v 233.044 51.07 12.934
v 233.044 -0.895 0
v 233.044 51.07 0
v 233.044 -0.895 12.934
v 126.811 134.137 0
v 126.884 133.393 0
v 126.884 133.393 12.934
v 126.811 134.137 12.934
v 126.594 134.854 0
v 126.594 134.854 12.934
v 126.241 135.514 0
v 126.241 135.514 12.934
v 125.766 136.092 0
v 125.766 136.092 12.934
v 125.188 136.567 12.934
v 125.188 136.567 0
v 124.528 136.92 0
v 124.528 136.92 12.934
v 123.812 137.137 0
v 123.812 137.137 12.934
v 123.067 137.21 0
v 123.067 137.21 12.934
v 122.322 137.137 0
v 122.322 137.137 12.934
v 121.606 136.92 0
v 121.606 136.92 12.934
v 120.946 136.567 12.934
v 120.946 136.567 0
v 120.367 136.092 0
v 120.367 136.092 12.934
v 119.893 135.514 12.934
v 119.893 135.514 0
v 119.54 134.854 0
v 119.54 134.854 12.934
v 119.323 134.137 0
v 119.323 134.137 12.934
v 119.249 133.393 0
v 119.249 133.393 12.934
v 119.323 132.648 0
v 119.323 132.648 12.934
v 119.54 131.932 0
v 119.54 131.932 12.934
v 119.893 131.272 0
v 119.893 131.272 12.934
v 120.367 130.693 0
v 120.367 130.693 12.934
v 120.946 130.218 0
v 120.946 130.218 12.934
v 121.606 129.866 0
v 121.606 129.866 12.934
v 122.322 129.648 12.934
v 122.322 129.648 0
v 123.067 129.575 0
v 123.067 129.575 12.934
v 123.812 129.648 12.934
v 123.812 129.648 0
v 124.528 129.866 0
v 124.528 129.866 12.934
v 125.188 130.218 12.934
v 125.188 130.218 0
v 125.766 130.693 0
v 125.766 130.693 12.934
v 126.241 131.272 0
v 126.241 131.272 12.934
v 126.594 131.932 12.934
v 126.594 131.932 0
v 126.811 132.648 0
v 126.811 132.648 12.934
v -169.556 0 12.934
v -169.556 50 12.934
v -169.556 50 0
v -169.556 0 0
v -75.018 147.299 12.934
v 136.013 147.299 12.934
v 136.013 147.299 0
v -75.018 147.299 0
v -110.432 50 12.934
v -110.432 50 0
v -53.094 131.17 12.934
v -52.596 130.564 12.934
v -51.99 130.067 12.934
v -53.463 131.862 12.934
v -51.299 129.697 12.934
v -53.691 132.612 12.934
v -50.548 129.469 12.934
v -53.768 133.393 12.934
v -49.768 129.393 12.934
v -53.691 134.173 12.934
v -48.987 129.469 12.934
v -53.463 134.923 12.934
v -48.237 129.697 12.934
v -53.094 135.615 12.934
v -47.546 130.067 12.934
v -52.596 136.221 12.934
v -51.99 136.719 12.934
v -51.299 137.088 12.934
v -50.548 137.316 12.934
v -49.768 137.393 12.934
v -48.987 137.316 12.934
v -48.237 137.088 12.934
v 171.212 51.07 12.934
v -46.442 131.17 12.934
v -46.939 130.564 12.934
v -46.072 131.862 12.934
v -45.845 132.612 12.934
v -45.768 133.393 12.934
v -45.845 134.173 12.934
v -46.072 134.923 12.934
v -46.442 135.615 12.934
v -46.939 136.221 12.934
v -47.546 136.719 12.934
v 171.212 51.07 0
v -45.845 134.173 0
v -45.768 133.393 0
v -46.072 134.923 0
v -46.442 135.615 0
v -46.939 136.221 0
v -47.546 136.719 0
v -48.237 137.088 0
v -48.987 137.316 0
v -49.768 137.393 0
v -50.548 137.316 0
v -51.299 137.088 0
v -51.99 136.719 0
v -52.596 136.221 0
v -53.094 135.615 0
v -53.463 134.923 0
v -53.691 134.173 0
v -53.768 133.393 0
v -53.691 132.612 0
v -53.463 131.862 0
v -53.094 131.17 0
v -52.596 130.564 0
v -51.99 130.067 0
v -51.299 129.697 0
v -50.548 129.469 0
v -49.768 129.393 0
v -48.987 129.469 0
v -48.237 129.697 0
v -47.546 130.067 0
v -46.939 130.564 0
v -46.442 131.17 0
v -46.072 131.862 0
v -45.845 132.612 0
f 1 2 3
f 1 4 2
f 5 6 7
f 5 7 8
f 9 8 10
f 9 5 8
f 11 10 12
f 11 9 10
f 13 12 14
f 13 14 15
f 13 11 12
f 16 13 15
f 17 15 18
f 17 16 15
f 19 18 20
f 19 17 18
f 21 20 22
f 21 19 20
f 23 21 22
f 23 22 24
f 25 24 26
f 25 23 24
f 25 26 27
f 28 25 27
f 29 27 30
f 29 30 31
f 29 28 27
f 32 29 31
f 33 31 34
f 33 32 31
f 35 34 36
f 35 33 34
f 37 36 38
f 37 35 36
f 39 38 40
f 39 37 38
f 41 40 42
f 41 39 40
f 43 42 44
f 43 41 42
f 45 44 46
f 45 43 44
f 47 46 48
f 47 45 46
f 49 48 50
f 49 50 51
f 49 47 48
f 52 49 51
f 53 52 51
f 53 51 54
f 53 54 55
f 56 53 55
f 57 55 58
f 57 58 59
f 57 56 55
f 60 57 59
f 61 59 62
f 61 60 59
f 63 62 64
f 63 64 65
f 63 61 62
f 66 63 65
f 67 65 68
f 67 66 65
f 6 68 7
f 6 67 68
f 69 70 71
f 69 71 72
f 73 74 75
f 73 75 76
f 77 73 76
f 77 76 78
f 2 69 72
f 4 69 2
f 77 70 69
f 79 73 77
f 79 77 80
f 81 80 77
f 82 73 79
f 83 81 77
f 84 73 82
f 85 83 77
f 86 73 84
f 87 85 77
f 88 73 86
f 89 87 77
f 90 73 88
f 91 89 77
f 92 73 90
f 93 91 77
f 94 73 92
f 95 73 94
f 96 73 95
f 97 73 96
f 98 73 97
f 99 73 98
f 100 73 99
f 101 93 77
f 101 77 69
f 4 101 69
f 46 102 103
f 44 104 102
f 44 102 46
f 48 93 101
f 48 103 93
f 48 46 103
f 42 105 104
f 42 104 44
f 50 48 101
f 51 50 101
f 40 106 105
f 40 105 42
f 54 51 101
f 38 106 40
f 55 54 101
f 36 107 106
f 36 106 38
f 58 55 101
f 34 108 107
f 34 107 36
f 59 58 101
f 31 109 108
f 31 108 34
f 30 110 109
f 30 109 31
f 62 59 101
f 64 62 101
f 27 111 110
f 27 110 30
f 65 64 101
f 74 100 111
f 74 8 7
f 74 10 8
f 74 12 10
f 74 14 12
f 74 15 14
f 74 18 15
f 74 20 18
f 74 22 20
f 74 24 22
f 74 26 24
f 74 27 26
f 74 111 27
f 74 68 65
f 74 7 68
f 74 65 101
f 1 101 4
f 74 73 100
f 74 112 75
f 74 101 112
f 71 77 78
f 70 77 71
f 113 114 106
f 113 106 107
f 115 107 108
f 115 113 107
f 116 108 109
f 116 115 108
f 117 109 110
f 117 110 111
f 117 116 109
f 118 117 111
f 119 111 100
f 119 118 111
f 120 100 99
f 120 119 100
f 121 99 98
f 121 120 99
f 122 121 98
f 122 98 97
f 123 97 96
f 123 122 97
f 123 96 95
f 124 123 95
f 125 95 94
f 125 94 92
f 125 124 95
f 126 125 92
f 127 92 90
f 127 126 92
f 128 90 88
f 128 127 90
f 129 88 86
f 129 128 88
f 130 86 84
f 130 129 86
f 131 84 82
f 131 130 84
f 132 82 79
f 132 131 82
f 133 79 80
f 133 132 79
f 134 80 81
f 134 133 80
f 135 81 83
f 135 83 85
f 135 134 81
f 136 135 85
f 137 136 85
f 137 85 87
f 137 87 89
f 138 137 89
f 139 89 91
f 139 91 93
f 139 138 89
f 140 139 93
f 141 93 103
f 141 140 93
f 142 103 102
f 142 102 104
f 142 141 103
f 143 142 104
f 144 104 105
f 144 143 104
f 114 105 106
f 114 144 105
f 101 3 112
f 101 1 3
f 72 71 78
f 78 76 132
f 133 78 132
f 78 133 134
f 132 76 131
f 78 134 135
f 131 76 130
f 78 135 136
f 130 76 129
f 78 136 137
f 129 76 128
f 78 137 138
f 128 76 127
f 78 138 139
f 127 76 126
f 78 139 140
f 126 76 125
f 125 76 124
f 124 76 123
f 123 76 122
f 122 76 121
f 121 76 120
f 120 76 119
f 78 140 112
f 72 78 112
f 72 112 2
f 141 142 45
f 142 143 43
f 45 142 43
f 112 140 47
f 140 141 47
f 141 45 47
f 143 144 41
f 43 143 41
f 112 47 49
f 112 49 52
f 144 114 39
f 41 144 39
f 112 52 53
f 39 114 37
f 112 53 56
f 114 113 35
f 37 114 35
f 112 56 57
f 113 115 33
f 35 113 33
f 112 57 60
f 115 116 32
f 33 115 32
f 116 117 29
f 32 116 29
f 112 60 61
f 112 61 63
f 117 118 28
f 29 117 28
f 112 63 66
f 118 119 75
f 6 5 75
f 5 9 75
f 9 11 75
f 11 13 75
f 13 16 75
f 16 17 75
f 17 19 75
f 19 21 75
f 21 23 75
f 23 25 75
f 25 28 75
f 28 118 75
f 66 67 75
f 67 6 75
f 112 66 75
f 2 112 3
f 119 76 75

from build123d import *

# Parameters (mm, degrees)
SKETCH1_R                = 3.817508494
SKETCH1_R_2              = 4
BOSS_EXTRUDE1_DEPTH      = 12.933846798
BOSS_EXTRUDE1_DEPTH_BACK = 0.0001


with BuildPart() as part:
    # Sketch1 → Boss-Extrude1 (new body, two sides)
    with BuildSketch(Plane.XY) as boss_extrude1_sk:
        Polygon((171.212226028, 51.069530268), (136.012624897, 147.29914138), (-75.017990846, 147.29914138), (-110.431982128, 50), (-169.555830253, 50), (-169.555830253, 0), (233.044157252, -0.895163773), (233.044157252, 51.069530268), align=None)
        with Locations((123.066759463, 133.392636667)):
            Circle(SKETCH1_R, mode=Mode.SUBTRACT)
        with Locations((-49.767828392, 133.392636667)):
            Circle(SKETCH1_R_2, mode=Mode.SUBTRACT)
    extrude(amount=BOSS_EXTRUDE1_DEPTH)
    extrude(boss_extrude1_sk.sketch, amount=-BOSS_EXTRUDE1_DEPTH_BACK)


solid = part.part
